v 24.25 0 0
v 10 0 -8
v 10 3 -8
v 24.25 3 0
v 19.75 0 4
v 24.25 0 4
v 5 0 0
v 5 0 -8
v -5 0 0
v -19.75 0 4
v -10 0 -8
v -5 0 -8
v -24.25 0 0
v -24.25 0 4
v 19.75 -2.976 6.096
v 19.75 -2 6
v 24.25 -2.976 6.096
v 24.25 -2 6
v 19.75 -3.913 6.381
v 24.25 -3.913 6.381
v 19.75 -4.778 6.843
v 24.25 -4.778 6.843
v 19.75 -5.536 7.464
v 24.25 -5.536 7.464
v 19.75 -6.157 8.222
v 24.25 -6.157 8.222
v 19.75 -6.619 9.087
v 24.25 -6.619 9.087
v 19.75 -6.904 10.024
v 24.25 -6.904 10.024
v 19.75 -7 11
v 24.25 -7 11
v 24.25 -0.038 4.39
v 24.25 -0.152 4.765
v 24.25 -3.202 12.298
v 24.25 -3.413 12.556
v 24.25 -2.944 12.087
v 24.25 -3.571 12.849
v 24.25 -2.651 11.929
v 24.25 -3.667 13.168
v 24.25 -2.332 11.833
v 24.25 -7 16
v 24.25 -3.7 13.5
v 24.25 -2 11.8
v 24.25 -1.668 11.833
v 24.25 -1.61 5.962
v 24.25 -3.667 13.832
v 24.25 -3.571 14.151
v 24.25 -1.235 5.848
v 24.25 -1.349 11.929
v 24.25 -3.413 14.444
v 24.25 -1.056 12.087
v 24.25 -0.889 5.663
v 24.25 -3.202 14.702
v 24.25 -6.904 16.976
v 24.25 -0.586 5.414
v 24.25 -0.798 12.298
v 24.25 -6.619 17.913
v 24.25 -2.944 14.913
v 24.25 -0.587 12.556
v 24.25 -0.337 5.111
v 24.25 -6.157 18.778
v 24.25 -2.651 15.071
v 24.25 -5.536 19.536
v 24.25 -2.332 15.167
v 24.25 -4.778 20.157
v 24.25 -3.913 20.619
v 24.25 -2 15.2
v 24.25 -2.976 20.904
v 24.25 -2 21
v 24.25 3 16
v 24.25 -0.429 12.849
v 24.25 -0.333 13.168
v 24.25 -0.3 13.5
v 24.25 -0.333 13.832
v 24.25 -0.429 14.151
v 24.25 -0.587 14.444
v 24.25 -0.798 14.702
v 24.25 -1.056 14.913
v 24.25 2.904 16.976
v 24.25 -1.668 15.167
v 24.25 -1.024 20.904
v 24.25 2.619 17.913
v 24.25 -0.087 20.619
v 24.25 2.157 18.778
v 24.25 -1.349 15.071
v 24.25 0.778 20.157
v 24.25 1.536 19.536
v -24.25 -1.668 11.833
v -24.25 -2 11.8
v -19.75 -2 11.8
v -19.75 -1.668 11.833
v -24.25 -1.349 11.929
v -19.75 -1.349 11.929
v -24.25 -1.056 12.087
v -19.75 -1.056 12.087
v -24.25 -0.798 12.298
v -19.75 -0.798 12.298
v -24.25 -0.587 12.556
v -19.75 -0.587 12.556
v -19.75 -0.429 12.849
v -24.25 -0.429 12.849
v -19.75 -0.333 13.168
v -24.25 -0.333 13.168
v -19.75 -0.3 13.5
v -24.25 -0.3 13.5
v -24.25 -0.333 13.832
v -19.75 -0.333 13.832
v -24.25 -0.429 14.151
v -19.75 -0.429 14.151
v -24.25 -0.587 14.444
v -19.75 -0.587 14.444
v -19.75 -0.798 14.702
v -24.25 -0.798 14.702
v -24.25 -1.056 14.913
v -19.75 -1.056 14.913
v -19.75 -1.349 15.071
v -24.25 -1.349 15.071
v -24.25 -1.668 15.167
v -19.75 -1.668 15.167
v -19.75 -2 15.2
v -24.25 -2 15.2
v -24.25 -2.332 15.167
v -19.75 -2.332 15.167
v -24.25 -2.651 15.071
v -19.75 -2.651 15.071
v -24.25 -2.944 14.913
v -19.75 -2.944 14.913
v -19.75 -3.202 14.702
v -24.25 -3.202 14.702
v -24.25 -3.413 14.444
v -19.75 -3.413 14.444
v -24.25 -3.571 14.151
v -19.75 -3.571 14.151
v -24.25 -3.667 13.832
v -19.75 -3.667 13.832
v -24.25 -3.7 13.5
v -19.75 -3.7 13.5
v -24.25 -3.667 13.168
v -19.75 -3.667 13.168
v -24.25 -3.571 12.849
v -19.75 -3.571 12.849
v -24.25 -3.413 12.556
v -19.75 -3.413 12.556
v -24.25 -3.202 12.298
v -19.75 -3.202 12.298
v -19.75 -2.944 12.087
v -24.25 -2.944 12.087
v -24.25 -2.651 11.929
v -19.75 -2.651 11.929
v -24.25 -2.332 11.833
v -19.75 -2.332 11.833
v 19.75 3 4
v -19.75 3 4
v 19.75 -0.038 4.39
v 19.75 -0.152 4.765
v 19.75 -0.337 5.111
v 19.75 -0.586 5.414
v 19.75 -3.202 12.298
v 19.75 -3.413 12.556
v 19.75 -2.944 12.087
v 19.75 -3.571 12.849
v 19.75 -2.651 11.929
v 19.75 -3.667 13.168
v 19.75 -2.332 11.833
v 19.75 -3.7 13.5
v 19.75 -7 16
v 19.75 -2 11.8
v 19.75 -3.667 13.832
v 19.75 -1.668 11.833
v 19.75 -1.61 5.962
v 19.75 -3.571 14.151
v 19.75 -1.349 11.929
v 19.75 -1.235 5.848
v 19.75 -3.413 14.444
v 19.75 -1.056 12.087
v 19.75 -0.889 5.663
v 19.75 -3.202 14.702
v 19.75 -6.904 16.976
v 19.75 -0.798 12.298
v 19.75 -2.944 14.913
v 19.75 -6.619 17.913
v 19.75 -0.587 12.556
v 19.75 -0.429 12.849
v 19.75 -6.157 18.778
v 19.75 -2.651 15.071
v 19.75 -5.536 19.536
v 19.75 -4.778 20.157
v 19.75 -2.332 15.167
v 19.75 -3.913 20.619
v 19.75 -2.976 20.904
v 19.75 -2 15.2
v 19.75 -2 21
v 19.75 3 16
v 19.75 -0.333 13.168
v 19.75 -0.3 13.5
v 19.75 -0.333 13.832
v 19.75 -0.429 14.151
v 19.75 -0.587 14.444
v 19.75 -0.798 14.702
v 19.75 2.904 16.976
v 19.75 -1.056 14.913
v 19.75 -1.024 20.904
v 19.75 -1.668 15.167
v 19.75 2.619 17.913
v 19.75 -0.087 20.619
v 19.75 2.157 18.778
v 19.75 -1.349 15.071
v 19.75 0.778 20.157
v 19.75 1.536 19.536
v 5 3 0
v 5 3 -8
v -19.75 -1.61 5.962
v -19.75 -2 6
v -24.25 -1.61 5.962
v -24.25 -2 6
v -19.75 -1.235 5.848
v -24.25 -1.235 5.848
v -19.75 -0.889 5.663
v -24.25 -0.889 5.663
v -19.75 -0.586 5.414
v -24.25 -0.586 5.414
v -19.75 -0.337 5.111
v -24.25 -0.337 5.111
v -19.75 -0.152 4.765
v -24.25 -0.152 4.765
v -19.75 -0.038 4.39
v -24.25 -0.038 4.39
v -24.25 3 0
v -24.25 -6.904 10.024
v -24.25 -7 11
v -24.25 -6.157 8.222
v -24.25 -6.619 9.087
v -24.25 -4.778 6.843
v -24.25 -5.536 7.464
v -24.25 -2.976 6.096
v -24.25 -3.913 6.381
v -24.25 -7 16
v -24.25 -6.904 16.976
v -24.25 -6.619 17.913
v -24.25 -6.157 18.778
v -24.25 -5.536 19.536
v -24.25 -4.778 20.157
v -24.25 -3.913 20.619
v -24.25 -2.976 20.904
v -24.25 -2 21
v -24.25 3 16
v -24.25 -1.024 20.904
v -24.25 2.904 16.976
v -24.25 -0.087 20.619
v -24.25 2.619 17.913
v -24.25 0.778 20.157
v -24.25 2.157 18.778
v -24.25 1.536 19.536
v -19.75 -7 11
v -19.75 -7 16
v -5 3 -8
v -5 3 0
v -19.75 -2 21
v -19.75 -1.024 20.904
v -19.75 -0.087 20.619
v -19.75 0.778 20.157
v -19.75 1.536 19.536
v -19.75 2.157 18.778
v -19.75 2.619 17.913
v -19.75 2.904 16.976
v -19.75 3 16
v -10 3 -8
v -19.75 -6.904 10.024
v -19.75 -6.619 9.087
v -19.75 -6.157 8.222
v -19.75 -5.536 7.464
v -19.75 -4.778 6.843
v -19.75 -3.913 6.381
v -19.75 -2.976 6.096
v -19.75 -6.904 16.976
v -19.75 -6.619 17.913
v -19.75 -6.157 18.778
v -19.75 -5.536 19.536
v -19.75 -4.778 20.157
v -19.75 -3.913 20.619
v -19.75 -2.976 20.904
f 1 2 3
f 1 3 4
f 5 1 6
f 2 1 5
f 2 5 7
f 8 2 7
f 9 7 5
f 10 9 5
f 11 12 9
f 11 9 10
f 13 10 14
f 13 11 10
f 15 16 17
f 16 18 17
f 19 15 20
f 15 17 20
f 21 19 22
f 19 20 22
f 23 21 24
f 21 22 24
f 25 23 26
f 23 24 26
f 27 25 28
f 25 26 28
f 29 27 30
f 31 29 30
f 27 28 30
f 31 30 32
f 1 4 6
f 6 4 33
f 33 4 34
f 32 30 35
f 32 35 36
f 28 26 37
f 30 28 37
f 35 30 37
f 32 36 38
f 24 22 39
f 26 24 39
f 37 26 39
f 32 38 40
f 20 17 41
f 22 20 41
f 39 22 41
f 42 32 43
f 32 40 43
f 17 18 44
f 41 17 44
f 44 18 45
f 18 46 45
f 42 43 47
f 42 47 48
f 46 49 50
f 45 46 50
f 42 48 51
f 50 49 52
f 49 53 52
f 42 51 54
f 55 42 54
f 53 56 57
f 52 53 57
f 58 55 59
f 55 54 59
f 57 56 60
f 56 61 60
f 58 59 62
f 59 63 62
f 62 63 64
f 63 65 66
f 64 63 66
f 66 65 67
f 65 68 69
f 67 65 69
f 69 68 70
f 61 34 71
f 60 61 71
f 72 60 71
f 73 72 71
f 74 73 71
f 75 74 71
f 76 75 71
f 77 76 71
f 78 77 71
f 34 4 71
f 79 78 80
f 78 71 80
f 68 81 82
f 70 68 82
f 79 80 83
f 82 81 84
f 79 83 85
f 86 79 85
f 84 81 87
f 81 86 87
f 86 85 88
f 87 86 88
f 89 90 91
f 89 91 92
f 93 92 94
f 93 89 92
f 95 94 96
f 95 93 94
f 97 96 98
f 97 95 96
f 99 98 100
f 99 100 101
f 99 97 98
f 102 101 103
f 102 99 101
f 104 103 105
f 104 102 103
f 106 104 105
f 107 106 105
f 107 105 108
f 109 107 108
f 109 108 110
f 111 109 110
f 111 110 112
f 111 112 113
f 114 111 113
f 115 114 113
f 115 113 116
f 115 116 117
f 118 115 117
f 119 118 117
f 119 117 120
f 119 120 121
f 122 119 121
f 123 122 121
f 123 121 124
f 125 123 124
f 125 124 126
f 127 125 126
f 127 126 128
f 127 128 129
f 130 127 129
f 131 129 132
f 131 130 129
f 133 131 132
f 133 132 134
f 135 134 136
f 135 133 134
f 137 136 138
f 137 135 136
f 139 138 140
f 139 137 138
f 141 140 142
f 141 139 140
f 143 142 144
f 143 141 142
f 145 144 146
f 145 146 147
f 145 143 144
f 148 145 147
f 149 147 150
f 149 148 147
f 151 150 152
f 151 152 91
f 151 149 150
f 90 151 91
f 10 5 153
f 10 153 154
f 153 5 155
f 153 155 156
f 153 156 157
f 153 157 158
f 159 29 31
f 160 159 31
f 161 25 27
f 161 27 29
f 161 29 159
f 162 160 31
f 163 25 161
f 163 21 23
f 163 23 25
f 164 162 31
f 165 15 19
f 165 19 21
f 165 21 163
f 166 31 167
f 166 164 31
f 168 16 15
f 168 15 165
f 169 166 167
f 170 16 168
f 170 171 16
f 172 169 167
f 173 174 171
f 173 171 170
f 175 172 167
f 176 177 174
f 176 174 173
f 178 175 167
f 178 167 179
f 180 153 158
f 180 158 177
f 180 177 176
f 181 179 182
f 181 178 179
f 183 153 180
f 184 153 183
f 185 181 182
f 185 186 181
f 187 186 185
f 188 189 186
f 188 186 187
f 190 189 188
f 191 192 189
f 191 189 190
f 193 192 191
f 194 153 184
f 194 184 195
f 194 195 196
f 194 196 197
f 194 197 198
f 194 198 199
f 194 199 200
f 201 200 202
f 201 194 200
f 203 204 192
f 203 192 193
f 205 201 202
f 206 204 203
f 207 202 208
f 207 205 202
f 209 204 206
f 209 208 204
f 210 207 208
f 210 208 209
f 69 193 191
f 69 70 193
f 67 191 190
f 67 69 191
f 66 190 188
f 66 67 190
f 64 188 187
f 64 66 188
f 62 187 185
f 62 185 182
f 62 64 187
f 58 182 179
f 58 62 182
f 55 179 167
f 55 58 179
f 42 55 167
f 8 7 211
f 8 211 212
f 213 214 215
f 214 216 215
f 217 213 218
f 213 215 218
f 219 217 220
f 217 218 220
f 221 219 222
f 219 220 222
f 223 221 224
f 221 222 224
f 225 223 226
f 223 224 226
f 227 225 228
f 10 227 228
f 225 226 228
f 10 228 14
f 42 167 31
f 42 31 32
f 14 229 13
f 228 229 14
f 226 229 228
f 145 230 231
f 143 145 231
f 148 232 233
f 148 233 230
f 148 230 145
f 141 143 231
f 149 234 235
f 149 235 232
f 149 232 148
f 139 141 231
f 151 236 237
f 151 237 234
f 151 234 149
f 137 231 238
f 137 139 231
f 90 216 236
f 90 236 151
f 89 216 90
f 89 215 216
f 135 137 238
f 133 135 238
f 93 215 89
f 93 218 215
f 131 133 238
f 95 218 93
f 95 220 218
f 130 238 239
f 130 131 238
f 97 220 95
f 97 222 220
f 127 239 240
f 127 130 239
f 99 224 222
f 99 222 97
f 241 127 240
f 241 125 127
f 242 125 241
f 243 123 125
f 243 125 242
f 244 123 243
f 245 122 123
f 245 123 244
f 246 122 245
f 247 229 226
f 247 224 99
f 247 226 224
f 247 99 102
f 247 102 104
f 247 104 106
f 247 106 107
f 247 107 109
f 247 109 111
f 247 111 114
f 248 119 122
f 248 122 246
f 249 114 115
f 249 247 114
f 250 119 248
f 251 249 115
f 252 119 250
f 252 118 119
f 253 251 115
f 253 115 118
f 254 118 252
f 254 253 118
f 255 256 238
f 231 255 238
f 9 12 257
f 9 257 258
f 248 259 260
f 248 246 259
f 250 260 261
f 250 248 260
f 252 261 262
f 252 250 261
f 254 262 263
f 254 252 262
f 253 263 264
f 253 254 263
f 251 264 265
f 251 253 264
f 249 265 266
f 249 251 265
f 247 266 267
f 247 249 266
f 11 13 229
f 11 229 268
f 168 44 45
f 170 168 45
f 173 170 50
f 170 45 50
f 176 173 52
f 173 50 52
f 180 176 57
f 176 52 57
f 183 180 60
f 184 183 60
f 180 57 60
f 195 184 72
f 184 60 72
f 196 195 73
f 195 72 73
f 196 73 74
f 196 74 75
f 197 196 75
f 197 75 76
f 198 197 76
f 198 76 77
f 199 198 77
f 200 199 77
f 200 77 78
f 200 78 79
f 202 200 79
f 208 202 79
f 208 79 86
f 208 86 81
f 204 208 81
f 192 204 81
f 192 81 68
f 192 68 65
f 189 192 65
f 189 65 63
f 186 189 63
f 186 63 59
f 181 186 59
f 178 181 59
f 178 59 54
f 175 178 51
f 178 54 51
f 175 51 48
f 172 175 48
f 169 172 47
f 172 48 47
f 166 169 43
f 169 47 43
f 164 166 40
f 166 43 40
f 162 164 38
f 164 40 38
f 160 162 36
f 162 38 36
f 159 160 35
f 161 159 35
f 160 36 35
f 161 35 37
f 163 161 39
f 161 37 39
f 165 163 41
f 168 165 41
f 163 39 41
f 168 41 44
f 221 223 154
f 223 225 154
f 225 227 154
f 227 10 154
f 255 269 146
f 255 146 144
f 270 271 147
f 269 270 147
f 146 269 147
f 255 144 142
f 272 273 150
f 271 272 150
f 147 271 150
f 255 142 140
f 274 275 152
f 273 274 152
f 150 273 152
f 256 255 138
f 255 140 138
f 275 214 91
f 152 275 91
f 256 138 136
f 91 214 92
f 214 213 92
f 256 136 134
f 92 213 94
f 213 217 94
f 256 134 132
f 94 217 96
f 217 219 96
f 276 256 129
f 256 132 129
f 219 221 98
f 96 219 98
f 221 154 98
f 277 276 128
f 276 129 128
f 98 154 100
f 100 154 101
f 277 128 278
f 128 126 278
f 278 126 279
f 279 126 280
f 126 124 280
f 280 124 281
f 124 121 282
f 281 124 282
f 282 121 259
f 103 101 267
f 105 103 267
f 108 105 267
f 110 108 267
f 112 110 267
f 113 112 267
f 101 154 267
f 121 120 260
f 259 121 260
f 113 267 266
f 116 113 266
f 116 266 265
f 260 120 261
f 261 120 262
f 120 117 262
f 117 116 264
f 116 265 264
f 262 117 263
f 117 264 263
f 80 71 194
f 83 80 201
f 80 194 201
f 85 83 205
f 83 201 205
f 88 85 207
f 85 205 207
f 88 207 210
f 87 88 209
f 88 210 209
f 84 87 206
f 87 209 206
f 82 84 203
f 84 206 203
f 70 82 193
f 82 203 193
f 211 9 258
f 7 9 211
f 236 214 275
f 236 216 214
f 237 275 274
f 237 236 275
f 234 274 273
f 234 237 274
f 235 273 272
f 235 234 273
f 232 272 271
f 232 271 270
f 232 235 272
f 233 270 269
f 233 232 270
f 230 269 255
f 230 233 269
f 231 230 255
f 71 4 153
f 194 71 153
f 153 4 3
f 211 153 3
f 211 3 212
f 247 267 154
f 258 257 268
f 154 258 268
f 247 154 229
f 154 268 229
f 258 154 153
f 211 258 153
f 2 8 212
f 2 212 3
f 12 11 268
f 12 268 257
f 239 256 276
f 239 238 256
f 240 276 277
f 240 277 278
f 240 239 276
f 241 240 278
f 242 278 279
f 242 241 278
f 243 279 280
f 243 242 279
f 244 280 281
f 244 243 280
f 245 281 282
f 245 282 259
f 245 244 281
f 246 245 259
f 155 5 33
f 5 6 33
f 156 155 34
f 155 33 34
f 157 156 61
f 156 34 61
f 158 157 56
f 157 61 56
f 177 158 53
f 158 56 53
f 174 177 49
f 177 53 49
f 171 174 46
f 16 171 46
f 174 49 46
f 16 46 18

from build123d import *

# Parameters (mm, degrees)
BOSS_EXTRUDE1_DEPTH = 3
SKETCH3_W           = 4.5
SKETCH3_H           = 15
BOSS_EXTRUDE3_DEPTH = 7
CUT_EXTRUDE1_REACH  = 55.313
SKETCH4_R           = 1.7
FILLET2_R           = 5
FILLET3_R           = 2


with BuildPart() as part:
    # Sketch1 → Boss-Extrude1 (new body)
    with BuildSketch(Plane(origin=(0, 0, 0), x_dir=(1, 0, 0), z_dir=(0, 1, 0))):
        Polygon((-5, 0), (5, 0), (5, 8), (10, 8), (24.25, 0), (24.25, -21), (19.75, -21), (19.75, -4), (-19.75, -4), (-19.75, -21), (-24.25, -21), (-24.25, 0), (-10, 8), (-5, 8), align=None)
    extrude(amount=BOSS_EXTRUDE1_DEPTH)

    # Sketch3 → Boss-Extrude3 (add)
    with BuildSketch(Plane.XZ):
        with Locations((22, 13.5)):
            Rectangle(SKETCH3_W, SKETCH3_H)
    boss_extrude3 = extrude(amount=BOSS_EXTRUDE3_DEPTH)

    # Sketch4 → Cut-Extrude1 (cut, up to next)
    with BuildSketch(Plane(origin=(24.25, 0, 0), x_dir=(0, 0, -1), z_dir=(1, 0, 0)), mode=Mode.PRIVATE) as cut_extrude1_sk1:
        with Locations((-13.5, -2)):
            Circle(SKETCH4_R)
    cut_extrude1_tool1 = extrude(cut_extrude1_sk1.sketch, amount=-CUT_EXTRUDE1_REACH, mode=Mode.PRIVATE) & part.part
    cut_extrude1 = cut_extrude1_tool1.solids().sort_by_distance((24.25, -2, 13.5))[0]
    add(cut_extrude1, mode=Mode.SUBTRACT)

    # Mirror2: Boss-Extrude3, Cut-Extrude1 across plane
    add(boss_extrude3.mirror(Plane(origin=(0, 0, 0), x_dir=(0, 0, 1), z_dir=(1, 0, 0))))
    add(cut_extrude1.mirror(Plane(origin=(0, 0, 0), x_dir=(0, 0, 1), z_dir=(1, 0, 0))), mode=Mode.SUBTRACT)

    # Fillet2
    fillet2_edges = [part.edges().sort_by_distance(p)[0] for p in [
        (22, -7, 6),
        (22, -7, 21),
        (22, 3, 21),
        (-22, -7, 6),
        (-22, -7, 21),
        (-22, 3, 21),
    ]]
    fillet(fillet2_edges, radius=FILLET2_R - 0.0001)  # a hair under: the kernel refuses the full size

    # Fillet3
    fillet3_edges = [part.edges().sort_by_distance(p)[0] for p in [
        (22, 0, 6),
        (-22, 0, 6),
    ]]
    fillet(fillet3_edges, radius=FILLET3_R)


solid = part.part
